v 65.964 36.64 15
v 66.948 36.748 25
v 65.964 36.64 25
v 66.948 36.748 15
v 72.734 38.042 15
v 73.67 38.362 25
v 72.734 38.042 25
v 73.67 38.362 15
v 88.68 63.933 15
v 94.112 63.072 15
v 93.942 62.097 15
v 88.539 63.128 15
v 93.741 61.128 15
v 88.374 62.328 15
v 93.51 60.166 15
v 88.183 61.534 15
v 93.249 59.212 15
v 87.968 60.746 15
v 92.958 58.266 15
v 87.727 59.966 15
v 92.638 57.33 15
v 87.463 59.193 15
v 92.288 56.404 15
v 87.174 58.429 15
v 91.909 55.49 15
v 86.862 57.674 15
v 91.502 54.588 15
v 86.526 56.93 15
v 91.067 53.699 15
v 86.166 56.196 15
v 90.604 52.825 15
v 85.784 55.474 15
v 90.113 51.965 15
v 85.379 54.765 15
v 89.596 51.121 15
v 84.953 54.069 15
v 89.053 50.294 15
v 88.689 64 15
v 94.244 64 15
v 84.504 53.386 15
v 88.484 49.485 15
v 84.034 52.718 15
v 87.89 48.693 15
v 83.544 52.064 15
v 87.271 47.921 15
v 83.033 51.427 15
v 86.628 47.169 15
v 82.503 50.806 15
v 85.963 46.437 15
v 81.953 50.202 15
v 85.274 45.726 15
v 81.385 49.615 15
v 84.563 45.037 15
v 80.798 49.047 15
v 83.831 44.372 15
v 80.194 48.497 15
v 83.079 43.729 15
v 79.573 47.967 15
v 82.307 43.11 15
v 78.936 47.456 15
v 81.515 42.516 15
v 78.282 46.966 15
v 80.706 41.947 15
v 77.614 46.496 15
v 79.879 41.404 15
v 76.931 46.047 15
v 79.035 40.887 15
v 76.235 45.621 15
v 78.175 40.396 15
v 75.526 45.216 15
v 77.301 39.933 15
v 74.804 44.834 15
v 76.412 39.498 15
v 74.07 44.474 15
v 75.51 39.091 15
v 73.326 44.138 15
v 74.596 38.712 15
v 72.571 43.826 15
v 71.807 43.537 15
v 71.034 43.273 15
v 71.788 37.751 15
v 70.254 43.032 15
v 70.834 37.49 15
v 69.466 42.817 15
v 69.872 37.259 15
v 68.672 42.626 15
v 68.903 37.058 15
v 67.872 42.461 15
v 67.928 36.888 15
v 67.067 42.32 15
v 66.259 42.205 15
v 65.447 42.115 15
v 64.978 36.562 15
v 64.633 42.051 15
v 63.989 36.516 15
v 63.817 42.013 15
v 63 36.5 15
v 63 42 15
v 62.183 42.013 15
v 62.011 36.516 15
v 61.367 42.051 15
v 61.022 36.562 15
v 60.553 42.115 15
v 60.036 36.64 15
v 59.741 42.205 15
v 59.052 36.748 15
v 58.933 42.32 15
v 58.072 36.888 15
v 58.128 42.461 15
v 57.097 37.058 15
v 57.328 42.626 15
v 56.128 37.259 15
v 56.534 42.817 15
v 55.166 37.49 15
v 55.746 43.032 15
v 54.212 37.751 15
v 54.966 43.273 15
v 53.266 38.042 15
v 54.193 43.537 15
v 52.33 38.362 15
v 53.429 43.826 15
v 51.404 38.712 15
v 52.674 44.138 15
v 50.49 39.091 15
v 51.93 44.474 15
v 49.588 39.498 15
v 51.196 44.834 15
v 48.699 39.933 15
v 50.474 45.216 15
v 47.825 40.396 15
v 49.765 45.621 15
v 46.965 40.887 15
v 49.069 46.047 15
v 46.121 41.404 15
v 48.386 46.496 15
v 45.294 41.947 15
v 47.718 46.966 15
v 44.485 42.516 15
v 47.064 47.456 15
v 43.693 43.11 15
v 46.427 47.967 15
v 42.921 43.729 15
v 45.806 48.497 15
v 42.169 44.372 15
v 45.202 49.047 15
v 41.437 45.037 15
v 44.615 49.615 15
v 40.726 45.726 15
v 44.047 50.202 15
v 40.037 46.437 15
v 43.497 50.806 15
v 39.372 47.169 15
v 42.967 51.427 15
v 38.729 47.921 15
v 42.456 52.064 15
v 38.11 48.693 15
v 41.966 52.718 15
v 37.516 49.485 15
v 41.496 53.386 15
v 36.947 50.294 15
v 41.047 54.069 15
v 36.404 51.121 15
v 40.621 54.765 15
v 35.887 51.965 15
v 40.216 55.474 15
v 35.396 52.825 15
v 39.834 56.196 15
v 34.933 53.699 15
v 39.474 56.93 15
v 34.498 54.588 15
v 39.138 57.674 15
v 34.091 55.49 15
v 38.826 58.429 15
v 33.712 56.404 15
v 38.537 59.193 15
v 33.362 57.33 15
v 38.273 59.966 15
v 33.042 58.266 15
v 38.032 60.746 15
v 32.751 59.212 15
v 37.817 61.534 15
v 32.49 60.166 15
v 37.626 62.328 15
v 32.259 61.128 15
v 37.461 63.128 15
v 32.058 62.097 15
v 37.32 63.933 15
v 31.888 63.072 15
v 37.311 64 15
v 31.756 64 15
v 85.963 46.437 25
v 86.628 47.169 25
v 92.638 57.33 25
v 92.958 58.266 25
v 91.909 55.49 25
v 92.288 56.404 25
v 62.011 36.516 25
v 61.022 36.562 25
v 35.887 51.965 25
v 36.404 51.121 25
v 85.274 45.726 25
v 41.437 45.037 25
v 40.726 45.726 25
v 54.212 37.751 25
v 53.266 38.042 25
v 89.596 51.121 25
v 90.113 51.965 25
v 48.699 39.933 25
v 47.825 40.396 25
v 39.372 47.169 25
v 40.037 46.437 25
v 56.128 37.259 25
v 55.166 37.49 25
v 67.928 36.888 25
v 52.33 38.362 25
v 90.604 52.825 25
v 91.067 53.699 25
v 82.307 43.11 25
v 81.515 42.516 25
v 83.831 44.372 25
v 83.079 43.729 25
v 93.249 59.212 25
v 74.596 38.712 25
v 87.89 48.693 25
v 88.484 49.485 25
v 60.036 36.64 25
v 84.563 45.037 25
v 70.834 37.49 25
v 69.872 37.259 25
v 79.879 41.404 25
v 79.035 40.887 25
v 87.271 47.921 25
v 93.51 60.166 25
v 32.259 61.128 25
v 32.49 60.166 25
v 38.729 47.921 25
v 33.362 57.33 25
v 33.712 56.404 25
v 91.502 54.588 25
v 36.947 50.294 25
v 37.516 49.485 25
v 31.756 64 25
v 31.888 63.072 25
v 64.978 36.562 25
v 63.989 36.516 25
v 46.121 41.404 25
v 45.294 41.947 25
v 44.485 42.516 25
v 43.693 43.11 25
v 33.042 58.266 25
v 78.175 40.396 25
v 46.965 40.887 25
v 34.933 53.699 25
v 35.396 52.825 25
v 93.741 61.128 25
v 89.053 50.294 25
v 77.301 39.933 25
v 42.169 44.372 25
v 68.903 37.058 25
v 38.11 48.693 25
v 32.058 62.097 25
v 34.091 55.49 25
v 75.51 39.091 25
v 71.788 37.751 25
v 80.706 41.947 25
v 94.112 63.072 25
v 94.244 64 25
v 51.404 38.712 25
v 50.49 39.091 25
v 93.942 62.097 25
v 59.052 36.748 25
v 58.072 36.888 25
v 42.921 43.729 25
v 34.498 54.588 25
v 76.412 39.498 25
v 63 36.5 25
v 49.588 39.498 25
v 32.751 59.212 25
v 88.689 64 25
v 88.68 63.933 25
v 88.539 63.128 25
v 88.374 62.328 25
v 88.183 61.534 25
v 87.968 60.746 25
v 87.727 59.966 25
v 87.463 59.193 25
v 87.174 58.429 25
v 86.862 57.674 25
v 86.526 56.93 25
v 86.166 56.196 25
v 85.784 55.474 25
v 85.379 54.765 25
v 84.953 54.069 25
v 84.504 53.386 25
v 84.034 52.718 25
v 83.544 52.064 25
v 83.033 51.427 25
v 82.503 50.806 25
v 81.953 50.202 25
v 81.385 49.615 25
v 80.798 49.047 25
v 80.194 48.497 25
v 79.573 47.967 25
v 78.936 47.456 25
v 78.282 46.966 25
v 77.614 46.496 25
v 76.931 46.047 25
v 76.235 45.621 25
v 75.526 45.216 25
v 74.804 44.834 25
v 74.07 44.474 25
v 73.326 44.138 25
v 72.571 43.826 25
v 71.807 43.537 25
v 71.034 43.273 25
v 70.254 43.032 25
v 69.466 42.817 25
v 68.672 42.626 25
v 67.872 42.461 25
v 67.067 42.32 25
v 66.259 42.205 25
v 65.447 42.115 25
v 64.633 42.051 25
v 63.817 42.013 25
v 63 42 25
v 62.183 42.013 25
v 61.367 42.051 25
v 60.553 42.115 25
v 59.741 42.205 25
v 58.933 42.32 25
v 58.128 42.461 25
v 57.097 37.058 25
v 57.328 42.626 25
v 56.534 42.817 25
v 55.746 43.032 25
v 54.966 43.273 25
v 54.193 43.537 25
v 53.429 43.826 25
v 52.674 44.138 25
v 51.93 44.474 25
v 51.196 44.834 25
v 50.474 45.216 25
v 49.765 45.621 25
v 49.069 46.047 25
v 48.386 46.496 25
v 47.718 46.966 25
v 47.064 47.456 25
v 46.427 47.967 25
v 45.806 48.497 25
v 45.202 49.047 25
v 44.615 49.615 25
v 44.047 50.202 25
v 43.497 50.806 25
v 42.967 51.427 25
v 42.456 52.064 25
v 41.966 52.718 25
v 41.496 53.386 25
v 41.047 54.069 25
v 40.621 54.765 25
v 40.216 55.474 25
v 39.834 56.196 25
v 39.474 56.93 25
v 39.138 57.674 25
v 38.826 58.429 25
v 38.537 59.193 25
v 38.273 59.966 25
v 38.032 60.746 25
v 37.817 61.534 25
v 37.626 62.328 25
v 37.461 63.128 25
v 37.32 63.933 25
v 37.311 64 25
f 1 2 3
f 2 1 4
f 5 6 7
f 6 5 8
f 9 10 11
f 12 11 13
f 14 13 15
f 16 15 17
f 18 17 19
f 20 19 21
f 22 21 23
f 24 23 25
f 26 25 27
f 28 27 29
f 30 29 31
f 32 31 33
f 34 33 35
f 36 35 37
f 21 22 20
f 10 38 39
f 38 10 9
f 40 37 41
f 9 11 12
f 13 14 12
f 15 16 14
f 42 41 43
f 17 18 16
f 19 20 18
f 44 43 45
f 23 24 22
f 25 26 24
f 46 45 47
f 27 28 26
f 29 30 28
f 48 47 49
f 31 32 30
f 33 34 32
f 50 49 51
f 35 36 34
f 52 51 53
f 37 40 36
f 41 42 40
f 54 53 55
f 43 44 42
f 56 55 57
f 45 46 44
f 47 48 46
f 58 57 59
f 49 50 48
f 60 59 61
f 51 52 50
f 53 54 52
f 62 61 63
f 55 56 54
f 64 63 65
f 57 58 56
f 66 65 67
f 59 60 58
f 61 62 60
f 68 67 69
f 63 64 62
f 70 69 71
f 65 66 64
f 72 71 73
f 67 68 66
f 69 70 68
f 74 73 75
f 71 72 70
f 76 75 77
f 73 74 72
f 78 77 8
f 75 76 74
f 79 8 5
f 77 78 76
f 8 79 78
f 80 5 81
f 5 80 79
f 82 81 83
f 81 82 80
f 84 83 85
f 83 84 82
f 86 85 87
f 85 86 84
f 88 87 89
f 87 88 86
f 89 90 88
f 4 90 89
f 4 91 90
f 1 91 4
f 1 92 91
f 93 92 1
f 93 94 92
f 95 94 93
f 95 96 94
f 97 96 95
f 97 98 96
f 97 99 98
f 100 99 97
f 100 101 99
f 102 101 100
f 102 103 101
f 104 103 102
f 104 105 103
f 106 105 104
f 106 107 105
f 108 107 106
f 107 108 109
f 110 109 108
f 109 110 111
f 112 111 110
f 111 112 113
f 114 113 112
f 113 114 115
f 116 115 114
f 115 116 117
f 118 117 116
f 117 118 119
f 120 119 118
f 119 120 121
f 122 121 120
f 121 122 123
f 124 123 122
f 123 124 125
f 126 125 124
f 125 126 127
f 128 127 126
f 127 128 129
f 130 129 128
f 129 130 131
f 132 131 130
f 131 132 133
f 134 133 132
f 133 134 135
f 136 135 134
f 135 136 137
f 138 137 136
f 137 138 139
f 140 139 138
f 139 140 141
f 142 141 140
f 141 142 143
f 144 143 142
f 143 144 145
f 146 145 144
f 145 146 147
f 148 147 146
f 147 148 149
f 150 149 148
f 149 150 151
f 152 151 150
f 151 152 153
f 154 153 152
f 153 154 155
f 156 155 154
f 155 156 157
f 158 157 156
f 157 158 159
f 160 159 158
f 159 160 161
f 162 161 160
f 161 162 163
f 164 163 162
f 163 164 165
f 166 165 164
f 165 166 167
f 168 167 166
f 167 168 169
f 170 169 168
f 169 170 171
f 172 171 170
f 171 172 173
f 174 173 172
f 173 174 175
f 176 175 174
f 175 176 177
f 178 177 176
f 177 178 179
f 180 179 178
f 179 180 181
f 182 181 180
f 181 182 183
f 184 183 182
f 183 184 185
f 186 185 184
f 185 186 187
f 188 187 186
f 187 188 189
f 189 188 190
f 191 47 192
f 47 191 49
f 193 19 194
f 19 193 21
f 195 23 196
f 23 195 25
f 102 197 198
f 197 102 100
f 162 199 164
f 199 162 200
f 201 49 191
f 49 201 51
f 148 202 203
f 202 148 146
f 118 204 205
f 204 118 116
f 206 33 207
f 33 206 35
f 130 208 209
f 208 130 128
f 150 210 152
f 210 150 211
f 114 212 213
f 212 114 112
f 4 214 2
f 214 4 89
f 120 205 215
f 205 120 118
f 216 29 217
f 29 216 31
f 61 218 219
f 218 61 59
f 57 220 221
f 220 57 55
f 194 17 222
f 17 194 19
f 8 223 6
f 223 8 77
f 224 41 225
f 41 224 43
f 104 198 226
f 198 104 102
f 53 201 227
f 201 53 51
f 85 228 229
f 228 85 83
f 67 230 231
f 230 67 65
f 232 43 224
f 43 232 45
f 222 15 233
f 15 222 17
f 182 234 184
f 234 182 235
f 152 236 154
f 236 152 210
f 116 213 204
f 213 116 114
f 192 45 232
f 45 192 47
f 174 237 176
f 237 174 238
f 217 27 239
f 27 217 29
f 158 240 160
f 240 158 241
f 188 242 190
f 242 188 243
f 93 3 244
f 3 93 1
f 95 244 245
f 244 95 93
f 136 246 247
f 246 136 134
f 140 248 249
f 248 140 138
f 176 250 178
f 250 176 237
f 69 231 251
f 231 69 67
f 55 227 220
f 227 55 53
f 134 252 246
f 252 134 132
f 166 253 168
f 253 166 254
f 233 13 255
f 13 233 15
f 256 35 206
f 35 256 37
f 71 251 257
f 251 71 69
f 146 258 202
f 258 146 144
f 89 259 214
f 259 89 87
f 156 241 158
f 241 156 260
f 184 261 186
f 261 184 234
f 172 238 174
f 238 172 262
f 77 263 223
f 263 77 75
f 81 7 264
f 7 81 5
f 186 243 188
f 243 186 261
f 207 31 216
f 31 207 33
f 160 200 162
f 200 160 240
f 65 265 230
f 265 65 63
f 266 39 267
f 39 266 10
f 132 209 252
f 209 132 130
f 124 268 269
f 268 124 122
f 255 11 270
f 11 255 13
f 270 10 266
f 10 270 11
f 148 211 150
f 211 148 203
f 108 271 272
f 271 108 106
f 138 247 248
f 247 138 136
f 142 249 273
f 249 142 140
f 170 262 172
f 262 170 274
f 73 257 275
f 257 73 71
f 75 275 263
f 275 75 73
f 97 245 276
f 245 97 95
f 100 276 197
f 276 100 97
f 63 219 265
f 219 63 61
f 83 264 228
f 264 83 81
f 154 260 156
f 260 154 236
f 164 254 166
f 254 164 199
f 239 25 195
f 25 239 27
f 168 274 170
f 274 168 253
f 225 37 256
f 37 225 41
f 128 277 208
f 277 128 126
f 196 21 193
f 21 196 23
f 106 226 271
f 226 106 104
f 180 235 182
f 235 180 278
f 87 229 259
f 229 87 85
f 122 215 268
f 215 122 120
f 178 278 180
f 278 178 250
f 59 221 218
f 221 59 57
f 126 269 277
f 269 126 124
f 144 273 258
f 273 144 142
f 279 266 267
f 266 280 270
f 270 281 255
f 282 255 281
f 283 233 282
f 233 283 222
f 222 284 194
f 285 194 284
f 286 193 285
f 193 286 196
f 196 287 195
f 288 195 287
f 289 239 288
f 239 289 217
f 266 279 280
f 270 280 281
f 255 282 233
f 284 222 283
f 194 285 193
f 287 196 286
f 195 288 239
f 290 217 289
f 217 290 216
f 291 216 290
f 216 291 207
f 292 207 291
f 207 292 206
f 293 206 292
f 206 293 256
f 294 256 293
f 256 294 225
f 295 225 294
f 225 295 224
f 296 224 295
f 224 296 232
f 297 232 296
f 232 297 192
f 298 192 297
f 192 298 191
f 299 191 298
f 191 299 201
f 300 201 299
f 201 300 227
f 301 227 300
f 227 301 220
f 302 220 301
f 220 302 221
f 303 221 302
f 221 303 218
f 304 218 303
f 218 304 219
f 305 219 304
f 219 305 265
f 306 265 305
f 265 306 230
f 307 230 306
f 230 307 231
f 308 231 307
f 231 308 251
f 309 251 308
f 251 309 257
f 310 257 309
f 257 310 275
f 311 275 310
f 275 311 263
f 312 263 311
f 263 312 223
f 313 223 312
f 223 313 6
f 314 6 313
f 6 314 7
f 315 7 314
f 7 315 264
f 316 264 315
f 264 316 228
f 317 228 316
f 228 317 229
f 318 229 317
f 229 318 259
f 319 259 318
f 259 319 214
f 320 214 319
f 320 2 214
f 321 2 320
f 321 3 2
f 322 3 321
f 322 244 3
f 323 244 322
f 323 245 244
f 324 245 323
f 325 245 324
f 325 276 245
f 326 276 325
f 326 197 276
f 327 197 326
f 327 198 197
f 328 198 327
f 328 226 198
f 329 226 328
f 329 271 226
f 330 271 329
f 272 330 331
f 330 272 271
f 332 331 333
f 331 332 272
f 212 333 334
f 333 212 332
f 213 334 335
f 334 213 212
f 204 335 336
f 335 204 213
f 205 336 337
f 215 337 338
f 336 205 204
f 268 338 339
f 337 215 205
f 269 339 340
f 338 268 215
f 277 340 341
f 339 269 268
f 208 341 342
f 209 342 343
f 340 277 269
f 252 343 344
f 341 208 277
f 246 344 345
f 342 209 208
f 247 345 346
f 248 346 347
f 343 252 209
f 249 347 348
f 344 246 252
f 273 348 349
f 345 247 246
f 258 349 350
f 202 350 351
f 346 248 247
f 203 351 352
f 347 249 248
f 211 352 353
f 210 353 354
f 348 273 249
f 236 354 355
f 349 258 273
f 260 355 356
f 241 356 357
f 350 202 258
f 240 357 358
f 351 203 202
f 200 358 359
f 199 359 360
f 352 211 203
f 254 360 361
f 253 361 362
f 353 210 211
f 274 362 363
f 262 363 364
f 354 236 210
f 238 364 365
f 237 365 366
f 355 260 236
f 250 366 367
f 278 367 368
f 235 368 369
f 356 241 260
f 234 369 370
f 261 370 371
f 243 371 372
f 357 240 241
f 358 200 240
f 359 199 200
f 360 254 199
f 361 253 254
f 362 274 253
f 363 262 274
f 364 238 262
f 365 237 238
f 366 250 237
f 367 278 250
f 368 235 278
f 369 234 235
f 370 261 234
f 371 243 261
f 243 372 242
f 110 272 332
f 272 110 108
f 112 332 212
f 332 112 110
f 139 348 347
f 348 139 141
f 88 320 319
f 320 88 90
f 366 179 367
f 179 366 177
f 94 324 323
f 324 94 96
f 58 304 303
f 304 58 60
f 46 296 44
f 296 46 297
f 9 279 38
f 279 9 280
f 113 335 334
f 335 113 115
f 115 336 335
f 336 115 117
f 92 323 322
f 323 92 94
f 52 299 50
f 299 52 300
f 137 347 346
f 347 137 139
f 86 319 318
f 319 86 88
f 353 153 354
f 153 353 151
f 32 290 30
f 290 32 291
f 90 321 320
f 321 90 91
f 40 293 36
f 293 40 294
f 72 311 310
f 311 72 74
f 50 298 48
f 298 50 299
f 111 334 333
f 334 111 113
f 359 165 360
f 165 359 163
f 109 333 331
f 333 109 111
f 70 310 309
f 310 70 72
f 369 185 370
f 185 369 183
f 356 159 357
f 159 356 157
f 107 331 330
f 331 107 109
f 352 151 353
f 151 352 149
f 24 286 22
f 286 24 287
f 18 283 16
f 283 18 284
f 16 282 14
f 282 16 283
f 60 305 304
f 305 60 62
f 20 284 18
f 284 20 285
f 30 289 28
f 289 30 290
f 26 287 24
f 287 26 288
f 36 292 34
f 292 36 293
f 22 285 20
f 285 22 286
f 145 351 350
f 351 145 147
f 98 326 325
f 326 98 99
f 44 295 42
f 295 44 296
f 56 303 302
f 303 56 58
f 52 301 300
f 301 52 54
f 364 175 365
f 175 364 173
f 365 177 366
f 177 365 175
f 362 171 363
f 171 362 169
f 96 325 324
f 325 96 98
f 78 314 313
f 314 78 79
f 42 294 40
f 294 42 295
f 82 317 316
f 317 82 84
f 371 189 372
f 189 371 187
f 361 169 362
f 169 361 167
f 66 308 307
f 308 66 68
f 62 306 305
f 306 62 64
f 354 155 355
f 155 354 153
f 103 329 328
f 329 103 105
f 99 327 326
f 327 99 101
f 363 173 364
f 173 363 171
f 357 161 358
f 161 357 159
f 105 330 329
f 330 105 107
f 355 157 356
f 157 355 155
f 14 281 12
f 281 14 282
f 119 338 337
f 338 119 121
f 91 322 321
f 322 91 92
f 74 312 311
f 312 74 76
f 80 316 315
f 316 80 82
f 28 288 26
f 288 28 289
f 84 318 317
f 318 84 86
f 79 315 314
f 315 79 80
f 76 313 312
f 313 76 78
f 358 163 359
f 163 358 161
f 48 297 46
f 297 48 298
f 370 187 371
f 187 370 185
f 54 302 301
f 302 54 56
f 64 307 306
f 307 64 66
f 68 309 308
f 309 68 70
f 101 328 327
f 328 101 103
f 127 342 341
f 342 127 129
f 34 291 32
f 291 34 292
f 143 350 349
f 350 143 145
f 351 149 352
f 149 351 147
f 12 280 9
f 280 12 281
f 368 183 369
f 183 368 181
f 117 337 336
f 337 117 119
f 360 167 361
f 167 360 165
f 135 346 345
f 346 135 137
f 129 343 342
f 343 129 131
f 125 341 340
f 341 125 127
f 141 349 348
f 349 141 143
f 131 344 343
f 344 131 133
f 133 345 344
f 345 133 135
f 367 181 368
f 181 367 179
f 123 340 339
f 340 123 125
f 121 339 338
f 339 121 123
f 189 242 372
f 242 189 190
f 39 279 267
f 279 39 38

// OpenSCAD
$fn = 200;
 
height = 10;

module cup_holder()
{
    plate_thickness = 2;  
    plate_length = 126;  
    plate_width = 106;
    difference()
    {
        translate([plate_length /2 , plate_width - 38, 15])
            cylinder(h = height, d = 63 , center = false);
        translate([plate_length /2 , plate_width - 38, 15])
            cylinder(h = height, d = 52 , center = false);
        translate([29 , plate_width - 42, 15])
            cube([80, 80, height]);
    }
}


cup_holder();
